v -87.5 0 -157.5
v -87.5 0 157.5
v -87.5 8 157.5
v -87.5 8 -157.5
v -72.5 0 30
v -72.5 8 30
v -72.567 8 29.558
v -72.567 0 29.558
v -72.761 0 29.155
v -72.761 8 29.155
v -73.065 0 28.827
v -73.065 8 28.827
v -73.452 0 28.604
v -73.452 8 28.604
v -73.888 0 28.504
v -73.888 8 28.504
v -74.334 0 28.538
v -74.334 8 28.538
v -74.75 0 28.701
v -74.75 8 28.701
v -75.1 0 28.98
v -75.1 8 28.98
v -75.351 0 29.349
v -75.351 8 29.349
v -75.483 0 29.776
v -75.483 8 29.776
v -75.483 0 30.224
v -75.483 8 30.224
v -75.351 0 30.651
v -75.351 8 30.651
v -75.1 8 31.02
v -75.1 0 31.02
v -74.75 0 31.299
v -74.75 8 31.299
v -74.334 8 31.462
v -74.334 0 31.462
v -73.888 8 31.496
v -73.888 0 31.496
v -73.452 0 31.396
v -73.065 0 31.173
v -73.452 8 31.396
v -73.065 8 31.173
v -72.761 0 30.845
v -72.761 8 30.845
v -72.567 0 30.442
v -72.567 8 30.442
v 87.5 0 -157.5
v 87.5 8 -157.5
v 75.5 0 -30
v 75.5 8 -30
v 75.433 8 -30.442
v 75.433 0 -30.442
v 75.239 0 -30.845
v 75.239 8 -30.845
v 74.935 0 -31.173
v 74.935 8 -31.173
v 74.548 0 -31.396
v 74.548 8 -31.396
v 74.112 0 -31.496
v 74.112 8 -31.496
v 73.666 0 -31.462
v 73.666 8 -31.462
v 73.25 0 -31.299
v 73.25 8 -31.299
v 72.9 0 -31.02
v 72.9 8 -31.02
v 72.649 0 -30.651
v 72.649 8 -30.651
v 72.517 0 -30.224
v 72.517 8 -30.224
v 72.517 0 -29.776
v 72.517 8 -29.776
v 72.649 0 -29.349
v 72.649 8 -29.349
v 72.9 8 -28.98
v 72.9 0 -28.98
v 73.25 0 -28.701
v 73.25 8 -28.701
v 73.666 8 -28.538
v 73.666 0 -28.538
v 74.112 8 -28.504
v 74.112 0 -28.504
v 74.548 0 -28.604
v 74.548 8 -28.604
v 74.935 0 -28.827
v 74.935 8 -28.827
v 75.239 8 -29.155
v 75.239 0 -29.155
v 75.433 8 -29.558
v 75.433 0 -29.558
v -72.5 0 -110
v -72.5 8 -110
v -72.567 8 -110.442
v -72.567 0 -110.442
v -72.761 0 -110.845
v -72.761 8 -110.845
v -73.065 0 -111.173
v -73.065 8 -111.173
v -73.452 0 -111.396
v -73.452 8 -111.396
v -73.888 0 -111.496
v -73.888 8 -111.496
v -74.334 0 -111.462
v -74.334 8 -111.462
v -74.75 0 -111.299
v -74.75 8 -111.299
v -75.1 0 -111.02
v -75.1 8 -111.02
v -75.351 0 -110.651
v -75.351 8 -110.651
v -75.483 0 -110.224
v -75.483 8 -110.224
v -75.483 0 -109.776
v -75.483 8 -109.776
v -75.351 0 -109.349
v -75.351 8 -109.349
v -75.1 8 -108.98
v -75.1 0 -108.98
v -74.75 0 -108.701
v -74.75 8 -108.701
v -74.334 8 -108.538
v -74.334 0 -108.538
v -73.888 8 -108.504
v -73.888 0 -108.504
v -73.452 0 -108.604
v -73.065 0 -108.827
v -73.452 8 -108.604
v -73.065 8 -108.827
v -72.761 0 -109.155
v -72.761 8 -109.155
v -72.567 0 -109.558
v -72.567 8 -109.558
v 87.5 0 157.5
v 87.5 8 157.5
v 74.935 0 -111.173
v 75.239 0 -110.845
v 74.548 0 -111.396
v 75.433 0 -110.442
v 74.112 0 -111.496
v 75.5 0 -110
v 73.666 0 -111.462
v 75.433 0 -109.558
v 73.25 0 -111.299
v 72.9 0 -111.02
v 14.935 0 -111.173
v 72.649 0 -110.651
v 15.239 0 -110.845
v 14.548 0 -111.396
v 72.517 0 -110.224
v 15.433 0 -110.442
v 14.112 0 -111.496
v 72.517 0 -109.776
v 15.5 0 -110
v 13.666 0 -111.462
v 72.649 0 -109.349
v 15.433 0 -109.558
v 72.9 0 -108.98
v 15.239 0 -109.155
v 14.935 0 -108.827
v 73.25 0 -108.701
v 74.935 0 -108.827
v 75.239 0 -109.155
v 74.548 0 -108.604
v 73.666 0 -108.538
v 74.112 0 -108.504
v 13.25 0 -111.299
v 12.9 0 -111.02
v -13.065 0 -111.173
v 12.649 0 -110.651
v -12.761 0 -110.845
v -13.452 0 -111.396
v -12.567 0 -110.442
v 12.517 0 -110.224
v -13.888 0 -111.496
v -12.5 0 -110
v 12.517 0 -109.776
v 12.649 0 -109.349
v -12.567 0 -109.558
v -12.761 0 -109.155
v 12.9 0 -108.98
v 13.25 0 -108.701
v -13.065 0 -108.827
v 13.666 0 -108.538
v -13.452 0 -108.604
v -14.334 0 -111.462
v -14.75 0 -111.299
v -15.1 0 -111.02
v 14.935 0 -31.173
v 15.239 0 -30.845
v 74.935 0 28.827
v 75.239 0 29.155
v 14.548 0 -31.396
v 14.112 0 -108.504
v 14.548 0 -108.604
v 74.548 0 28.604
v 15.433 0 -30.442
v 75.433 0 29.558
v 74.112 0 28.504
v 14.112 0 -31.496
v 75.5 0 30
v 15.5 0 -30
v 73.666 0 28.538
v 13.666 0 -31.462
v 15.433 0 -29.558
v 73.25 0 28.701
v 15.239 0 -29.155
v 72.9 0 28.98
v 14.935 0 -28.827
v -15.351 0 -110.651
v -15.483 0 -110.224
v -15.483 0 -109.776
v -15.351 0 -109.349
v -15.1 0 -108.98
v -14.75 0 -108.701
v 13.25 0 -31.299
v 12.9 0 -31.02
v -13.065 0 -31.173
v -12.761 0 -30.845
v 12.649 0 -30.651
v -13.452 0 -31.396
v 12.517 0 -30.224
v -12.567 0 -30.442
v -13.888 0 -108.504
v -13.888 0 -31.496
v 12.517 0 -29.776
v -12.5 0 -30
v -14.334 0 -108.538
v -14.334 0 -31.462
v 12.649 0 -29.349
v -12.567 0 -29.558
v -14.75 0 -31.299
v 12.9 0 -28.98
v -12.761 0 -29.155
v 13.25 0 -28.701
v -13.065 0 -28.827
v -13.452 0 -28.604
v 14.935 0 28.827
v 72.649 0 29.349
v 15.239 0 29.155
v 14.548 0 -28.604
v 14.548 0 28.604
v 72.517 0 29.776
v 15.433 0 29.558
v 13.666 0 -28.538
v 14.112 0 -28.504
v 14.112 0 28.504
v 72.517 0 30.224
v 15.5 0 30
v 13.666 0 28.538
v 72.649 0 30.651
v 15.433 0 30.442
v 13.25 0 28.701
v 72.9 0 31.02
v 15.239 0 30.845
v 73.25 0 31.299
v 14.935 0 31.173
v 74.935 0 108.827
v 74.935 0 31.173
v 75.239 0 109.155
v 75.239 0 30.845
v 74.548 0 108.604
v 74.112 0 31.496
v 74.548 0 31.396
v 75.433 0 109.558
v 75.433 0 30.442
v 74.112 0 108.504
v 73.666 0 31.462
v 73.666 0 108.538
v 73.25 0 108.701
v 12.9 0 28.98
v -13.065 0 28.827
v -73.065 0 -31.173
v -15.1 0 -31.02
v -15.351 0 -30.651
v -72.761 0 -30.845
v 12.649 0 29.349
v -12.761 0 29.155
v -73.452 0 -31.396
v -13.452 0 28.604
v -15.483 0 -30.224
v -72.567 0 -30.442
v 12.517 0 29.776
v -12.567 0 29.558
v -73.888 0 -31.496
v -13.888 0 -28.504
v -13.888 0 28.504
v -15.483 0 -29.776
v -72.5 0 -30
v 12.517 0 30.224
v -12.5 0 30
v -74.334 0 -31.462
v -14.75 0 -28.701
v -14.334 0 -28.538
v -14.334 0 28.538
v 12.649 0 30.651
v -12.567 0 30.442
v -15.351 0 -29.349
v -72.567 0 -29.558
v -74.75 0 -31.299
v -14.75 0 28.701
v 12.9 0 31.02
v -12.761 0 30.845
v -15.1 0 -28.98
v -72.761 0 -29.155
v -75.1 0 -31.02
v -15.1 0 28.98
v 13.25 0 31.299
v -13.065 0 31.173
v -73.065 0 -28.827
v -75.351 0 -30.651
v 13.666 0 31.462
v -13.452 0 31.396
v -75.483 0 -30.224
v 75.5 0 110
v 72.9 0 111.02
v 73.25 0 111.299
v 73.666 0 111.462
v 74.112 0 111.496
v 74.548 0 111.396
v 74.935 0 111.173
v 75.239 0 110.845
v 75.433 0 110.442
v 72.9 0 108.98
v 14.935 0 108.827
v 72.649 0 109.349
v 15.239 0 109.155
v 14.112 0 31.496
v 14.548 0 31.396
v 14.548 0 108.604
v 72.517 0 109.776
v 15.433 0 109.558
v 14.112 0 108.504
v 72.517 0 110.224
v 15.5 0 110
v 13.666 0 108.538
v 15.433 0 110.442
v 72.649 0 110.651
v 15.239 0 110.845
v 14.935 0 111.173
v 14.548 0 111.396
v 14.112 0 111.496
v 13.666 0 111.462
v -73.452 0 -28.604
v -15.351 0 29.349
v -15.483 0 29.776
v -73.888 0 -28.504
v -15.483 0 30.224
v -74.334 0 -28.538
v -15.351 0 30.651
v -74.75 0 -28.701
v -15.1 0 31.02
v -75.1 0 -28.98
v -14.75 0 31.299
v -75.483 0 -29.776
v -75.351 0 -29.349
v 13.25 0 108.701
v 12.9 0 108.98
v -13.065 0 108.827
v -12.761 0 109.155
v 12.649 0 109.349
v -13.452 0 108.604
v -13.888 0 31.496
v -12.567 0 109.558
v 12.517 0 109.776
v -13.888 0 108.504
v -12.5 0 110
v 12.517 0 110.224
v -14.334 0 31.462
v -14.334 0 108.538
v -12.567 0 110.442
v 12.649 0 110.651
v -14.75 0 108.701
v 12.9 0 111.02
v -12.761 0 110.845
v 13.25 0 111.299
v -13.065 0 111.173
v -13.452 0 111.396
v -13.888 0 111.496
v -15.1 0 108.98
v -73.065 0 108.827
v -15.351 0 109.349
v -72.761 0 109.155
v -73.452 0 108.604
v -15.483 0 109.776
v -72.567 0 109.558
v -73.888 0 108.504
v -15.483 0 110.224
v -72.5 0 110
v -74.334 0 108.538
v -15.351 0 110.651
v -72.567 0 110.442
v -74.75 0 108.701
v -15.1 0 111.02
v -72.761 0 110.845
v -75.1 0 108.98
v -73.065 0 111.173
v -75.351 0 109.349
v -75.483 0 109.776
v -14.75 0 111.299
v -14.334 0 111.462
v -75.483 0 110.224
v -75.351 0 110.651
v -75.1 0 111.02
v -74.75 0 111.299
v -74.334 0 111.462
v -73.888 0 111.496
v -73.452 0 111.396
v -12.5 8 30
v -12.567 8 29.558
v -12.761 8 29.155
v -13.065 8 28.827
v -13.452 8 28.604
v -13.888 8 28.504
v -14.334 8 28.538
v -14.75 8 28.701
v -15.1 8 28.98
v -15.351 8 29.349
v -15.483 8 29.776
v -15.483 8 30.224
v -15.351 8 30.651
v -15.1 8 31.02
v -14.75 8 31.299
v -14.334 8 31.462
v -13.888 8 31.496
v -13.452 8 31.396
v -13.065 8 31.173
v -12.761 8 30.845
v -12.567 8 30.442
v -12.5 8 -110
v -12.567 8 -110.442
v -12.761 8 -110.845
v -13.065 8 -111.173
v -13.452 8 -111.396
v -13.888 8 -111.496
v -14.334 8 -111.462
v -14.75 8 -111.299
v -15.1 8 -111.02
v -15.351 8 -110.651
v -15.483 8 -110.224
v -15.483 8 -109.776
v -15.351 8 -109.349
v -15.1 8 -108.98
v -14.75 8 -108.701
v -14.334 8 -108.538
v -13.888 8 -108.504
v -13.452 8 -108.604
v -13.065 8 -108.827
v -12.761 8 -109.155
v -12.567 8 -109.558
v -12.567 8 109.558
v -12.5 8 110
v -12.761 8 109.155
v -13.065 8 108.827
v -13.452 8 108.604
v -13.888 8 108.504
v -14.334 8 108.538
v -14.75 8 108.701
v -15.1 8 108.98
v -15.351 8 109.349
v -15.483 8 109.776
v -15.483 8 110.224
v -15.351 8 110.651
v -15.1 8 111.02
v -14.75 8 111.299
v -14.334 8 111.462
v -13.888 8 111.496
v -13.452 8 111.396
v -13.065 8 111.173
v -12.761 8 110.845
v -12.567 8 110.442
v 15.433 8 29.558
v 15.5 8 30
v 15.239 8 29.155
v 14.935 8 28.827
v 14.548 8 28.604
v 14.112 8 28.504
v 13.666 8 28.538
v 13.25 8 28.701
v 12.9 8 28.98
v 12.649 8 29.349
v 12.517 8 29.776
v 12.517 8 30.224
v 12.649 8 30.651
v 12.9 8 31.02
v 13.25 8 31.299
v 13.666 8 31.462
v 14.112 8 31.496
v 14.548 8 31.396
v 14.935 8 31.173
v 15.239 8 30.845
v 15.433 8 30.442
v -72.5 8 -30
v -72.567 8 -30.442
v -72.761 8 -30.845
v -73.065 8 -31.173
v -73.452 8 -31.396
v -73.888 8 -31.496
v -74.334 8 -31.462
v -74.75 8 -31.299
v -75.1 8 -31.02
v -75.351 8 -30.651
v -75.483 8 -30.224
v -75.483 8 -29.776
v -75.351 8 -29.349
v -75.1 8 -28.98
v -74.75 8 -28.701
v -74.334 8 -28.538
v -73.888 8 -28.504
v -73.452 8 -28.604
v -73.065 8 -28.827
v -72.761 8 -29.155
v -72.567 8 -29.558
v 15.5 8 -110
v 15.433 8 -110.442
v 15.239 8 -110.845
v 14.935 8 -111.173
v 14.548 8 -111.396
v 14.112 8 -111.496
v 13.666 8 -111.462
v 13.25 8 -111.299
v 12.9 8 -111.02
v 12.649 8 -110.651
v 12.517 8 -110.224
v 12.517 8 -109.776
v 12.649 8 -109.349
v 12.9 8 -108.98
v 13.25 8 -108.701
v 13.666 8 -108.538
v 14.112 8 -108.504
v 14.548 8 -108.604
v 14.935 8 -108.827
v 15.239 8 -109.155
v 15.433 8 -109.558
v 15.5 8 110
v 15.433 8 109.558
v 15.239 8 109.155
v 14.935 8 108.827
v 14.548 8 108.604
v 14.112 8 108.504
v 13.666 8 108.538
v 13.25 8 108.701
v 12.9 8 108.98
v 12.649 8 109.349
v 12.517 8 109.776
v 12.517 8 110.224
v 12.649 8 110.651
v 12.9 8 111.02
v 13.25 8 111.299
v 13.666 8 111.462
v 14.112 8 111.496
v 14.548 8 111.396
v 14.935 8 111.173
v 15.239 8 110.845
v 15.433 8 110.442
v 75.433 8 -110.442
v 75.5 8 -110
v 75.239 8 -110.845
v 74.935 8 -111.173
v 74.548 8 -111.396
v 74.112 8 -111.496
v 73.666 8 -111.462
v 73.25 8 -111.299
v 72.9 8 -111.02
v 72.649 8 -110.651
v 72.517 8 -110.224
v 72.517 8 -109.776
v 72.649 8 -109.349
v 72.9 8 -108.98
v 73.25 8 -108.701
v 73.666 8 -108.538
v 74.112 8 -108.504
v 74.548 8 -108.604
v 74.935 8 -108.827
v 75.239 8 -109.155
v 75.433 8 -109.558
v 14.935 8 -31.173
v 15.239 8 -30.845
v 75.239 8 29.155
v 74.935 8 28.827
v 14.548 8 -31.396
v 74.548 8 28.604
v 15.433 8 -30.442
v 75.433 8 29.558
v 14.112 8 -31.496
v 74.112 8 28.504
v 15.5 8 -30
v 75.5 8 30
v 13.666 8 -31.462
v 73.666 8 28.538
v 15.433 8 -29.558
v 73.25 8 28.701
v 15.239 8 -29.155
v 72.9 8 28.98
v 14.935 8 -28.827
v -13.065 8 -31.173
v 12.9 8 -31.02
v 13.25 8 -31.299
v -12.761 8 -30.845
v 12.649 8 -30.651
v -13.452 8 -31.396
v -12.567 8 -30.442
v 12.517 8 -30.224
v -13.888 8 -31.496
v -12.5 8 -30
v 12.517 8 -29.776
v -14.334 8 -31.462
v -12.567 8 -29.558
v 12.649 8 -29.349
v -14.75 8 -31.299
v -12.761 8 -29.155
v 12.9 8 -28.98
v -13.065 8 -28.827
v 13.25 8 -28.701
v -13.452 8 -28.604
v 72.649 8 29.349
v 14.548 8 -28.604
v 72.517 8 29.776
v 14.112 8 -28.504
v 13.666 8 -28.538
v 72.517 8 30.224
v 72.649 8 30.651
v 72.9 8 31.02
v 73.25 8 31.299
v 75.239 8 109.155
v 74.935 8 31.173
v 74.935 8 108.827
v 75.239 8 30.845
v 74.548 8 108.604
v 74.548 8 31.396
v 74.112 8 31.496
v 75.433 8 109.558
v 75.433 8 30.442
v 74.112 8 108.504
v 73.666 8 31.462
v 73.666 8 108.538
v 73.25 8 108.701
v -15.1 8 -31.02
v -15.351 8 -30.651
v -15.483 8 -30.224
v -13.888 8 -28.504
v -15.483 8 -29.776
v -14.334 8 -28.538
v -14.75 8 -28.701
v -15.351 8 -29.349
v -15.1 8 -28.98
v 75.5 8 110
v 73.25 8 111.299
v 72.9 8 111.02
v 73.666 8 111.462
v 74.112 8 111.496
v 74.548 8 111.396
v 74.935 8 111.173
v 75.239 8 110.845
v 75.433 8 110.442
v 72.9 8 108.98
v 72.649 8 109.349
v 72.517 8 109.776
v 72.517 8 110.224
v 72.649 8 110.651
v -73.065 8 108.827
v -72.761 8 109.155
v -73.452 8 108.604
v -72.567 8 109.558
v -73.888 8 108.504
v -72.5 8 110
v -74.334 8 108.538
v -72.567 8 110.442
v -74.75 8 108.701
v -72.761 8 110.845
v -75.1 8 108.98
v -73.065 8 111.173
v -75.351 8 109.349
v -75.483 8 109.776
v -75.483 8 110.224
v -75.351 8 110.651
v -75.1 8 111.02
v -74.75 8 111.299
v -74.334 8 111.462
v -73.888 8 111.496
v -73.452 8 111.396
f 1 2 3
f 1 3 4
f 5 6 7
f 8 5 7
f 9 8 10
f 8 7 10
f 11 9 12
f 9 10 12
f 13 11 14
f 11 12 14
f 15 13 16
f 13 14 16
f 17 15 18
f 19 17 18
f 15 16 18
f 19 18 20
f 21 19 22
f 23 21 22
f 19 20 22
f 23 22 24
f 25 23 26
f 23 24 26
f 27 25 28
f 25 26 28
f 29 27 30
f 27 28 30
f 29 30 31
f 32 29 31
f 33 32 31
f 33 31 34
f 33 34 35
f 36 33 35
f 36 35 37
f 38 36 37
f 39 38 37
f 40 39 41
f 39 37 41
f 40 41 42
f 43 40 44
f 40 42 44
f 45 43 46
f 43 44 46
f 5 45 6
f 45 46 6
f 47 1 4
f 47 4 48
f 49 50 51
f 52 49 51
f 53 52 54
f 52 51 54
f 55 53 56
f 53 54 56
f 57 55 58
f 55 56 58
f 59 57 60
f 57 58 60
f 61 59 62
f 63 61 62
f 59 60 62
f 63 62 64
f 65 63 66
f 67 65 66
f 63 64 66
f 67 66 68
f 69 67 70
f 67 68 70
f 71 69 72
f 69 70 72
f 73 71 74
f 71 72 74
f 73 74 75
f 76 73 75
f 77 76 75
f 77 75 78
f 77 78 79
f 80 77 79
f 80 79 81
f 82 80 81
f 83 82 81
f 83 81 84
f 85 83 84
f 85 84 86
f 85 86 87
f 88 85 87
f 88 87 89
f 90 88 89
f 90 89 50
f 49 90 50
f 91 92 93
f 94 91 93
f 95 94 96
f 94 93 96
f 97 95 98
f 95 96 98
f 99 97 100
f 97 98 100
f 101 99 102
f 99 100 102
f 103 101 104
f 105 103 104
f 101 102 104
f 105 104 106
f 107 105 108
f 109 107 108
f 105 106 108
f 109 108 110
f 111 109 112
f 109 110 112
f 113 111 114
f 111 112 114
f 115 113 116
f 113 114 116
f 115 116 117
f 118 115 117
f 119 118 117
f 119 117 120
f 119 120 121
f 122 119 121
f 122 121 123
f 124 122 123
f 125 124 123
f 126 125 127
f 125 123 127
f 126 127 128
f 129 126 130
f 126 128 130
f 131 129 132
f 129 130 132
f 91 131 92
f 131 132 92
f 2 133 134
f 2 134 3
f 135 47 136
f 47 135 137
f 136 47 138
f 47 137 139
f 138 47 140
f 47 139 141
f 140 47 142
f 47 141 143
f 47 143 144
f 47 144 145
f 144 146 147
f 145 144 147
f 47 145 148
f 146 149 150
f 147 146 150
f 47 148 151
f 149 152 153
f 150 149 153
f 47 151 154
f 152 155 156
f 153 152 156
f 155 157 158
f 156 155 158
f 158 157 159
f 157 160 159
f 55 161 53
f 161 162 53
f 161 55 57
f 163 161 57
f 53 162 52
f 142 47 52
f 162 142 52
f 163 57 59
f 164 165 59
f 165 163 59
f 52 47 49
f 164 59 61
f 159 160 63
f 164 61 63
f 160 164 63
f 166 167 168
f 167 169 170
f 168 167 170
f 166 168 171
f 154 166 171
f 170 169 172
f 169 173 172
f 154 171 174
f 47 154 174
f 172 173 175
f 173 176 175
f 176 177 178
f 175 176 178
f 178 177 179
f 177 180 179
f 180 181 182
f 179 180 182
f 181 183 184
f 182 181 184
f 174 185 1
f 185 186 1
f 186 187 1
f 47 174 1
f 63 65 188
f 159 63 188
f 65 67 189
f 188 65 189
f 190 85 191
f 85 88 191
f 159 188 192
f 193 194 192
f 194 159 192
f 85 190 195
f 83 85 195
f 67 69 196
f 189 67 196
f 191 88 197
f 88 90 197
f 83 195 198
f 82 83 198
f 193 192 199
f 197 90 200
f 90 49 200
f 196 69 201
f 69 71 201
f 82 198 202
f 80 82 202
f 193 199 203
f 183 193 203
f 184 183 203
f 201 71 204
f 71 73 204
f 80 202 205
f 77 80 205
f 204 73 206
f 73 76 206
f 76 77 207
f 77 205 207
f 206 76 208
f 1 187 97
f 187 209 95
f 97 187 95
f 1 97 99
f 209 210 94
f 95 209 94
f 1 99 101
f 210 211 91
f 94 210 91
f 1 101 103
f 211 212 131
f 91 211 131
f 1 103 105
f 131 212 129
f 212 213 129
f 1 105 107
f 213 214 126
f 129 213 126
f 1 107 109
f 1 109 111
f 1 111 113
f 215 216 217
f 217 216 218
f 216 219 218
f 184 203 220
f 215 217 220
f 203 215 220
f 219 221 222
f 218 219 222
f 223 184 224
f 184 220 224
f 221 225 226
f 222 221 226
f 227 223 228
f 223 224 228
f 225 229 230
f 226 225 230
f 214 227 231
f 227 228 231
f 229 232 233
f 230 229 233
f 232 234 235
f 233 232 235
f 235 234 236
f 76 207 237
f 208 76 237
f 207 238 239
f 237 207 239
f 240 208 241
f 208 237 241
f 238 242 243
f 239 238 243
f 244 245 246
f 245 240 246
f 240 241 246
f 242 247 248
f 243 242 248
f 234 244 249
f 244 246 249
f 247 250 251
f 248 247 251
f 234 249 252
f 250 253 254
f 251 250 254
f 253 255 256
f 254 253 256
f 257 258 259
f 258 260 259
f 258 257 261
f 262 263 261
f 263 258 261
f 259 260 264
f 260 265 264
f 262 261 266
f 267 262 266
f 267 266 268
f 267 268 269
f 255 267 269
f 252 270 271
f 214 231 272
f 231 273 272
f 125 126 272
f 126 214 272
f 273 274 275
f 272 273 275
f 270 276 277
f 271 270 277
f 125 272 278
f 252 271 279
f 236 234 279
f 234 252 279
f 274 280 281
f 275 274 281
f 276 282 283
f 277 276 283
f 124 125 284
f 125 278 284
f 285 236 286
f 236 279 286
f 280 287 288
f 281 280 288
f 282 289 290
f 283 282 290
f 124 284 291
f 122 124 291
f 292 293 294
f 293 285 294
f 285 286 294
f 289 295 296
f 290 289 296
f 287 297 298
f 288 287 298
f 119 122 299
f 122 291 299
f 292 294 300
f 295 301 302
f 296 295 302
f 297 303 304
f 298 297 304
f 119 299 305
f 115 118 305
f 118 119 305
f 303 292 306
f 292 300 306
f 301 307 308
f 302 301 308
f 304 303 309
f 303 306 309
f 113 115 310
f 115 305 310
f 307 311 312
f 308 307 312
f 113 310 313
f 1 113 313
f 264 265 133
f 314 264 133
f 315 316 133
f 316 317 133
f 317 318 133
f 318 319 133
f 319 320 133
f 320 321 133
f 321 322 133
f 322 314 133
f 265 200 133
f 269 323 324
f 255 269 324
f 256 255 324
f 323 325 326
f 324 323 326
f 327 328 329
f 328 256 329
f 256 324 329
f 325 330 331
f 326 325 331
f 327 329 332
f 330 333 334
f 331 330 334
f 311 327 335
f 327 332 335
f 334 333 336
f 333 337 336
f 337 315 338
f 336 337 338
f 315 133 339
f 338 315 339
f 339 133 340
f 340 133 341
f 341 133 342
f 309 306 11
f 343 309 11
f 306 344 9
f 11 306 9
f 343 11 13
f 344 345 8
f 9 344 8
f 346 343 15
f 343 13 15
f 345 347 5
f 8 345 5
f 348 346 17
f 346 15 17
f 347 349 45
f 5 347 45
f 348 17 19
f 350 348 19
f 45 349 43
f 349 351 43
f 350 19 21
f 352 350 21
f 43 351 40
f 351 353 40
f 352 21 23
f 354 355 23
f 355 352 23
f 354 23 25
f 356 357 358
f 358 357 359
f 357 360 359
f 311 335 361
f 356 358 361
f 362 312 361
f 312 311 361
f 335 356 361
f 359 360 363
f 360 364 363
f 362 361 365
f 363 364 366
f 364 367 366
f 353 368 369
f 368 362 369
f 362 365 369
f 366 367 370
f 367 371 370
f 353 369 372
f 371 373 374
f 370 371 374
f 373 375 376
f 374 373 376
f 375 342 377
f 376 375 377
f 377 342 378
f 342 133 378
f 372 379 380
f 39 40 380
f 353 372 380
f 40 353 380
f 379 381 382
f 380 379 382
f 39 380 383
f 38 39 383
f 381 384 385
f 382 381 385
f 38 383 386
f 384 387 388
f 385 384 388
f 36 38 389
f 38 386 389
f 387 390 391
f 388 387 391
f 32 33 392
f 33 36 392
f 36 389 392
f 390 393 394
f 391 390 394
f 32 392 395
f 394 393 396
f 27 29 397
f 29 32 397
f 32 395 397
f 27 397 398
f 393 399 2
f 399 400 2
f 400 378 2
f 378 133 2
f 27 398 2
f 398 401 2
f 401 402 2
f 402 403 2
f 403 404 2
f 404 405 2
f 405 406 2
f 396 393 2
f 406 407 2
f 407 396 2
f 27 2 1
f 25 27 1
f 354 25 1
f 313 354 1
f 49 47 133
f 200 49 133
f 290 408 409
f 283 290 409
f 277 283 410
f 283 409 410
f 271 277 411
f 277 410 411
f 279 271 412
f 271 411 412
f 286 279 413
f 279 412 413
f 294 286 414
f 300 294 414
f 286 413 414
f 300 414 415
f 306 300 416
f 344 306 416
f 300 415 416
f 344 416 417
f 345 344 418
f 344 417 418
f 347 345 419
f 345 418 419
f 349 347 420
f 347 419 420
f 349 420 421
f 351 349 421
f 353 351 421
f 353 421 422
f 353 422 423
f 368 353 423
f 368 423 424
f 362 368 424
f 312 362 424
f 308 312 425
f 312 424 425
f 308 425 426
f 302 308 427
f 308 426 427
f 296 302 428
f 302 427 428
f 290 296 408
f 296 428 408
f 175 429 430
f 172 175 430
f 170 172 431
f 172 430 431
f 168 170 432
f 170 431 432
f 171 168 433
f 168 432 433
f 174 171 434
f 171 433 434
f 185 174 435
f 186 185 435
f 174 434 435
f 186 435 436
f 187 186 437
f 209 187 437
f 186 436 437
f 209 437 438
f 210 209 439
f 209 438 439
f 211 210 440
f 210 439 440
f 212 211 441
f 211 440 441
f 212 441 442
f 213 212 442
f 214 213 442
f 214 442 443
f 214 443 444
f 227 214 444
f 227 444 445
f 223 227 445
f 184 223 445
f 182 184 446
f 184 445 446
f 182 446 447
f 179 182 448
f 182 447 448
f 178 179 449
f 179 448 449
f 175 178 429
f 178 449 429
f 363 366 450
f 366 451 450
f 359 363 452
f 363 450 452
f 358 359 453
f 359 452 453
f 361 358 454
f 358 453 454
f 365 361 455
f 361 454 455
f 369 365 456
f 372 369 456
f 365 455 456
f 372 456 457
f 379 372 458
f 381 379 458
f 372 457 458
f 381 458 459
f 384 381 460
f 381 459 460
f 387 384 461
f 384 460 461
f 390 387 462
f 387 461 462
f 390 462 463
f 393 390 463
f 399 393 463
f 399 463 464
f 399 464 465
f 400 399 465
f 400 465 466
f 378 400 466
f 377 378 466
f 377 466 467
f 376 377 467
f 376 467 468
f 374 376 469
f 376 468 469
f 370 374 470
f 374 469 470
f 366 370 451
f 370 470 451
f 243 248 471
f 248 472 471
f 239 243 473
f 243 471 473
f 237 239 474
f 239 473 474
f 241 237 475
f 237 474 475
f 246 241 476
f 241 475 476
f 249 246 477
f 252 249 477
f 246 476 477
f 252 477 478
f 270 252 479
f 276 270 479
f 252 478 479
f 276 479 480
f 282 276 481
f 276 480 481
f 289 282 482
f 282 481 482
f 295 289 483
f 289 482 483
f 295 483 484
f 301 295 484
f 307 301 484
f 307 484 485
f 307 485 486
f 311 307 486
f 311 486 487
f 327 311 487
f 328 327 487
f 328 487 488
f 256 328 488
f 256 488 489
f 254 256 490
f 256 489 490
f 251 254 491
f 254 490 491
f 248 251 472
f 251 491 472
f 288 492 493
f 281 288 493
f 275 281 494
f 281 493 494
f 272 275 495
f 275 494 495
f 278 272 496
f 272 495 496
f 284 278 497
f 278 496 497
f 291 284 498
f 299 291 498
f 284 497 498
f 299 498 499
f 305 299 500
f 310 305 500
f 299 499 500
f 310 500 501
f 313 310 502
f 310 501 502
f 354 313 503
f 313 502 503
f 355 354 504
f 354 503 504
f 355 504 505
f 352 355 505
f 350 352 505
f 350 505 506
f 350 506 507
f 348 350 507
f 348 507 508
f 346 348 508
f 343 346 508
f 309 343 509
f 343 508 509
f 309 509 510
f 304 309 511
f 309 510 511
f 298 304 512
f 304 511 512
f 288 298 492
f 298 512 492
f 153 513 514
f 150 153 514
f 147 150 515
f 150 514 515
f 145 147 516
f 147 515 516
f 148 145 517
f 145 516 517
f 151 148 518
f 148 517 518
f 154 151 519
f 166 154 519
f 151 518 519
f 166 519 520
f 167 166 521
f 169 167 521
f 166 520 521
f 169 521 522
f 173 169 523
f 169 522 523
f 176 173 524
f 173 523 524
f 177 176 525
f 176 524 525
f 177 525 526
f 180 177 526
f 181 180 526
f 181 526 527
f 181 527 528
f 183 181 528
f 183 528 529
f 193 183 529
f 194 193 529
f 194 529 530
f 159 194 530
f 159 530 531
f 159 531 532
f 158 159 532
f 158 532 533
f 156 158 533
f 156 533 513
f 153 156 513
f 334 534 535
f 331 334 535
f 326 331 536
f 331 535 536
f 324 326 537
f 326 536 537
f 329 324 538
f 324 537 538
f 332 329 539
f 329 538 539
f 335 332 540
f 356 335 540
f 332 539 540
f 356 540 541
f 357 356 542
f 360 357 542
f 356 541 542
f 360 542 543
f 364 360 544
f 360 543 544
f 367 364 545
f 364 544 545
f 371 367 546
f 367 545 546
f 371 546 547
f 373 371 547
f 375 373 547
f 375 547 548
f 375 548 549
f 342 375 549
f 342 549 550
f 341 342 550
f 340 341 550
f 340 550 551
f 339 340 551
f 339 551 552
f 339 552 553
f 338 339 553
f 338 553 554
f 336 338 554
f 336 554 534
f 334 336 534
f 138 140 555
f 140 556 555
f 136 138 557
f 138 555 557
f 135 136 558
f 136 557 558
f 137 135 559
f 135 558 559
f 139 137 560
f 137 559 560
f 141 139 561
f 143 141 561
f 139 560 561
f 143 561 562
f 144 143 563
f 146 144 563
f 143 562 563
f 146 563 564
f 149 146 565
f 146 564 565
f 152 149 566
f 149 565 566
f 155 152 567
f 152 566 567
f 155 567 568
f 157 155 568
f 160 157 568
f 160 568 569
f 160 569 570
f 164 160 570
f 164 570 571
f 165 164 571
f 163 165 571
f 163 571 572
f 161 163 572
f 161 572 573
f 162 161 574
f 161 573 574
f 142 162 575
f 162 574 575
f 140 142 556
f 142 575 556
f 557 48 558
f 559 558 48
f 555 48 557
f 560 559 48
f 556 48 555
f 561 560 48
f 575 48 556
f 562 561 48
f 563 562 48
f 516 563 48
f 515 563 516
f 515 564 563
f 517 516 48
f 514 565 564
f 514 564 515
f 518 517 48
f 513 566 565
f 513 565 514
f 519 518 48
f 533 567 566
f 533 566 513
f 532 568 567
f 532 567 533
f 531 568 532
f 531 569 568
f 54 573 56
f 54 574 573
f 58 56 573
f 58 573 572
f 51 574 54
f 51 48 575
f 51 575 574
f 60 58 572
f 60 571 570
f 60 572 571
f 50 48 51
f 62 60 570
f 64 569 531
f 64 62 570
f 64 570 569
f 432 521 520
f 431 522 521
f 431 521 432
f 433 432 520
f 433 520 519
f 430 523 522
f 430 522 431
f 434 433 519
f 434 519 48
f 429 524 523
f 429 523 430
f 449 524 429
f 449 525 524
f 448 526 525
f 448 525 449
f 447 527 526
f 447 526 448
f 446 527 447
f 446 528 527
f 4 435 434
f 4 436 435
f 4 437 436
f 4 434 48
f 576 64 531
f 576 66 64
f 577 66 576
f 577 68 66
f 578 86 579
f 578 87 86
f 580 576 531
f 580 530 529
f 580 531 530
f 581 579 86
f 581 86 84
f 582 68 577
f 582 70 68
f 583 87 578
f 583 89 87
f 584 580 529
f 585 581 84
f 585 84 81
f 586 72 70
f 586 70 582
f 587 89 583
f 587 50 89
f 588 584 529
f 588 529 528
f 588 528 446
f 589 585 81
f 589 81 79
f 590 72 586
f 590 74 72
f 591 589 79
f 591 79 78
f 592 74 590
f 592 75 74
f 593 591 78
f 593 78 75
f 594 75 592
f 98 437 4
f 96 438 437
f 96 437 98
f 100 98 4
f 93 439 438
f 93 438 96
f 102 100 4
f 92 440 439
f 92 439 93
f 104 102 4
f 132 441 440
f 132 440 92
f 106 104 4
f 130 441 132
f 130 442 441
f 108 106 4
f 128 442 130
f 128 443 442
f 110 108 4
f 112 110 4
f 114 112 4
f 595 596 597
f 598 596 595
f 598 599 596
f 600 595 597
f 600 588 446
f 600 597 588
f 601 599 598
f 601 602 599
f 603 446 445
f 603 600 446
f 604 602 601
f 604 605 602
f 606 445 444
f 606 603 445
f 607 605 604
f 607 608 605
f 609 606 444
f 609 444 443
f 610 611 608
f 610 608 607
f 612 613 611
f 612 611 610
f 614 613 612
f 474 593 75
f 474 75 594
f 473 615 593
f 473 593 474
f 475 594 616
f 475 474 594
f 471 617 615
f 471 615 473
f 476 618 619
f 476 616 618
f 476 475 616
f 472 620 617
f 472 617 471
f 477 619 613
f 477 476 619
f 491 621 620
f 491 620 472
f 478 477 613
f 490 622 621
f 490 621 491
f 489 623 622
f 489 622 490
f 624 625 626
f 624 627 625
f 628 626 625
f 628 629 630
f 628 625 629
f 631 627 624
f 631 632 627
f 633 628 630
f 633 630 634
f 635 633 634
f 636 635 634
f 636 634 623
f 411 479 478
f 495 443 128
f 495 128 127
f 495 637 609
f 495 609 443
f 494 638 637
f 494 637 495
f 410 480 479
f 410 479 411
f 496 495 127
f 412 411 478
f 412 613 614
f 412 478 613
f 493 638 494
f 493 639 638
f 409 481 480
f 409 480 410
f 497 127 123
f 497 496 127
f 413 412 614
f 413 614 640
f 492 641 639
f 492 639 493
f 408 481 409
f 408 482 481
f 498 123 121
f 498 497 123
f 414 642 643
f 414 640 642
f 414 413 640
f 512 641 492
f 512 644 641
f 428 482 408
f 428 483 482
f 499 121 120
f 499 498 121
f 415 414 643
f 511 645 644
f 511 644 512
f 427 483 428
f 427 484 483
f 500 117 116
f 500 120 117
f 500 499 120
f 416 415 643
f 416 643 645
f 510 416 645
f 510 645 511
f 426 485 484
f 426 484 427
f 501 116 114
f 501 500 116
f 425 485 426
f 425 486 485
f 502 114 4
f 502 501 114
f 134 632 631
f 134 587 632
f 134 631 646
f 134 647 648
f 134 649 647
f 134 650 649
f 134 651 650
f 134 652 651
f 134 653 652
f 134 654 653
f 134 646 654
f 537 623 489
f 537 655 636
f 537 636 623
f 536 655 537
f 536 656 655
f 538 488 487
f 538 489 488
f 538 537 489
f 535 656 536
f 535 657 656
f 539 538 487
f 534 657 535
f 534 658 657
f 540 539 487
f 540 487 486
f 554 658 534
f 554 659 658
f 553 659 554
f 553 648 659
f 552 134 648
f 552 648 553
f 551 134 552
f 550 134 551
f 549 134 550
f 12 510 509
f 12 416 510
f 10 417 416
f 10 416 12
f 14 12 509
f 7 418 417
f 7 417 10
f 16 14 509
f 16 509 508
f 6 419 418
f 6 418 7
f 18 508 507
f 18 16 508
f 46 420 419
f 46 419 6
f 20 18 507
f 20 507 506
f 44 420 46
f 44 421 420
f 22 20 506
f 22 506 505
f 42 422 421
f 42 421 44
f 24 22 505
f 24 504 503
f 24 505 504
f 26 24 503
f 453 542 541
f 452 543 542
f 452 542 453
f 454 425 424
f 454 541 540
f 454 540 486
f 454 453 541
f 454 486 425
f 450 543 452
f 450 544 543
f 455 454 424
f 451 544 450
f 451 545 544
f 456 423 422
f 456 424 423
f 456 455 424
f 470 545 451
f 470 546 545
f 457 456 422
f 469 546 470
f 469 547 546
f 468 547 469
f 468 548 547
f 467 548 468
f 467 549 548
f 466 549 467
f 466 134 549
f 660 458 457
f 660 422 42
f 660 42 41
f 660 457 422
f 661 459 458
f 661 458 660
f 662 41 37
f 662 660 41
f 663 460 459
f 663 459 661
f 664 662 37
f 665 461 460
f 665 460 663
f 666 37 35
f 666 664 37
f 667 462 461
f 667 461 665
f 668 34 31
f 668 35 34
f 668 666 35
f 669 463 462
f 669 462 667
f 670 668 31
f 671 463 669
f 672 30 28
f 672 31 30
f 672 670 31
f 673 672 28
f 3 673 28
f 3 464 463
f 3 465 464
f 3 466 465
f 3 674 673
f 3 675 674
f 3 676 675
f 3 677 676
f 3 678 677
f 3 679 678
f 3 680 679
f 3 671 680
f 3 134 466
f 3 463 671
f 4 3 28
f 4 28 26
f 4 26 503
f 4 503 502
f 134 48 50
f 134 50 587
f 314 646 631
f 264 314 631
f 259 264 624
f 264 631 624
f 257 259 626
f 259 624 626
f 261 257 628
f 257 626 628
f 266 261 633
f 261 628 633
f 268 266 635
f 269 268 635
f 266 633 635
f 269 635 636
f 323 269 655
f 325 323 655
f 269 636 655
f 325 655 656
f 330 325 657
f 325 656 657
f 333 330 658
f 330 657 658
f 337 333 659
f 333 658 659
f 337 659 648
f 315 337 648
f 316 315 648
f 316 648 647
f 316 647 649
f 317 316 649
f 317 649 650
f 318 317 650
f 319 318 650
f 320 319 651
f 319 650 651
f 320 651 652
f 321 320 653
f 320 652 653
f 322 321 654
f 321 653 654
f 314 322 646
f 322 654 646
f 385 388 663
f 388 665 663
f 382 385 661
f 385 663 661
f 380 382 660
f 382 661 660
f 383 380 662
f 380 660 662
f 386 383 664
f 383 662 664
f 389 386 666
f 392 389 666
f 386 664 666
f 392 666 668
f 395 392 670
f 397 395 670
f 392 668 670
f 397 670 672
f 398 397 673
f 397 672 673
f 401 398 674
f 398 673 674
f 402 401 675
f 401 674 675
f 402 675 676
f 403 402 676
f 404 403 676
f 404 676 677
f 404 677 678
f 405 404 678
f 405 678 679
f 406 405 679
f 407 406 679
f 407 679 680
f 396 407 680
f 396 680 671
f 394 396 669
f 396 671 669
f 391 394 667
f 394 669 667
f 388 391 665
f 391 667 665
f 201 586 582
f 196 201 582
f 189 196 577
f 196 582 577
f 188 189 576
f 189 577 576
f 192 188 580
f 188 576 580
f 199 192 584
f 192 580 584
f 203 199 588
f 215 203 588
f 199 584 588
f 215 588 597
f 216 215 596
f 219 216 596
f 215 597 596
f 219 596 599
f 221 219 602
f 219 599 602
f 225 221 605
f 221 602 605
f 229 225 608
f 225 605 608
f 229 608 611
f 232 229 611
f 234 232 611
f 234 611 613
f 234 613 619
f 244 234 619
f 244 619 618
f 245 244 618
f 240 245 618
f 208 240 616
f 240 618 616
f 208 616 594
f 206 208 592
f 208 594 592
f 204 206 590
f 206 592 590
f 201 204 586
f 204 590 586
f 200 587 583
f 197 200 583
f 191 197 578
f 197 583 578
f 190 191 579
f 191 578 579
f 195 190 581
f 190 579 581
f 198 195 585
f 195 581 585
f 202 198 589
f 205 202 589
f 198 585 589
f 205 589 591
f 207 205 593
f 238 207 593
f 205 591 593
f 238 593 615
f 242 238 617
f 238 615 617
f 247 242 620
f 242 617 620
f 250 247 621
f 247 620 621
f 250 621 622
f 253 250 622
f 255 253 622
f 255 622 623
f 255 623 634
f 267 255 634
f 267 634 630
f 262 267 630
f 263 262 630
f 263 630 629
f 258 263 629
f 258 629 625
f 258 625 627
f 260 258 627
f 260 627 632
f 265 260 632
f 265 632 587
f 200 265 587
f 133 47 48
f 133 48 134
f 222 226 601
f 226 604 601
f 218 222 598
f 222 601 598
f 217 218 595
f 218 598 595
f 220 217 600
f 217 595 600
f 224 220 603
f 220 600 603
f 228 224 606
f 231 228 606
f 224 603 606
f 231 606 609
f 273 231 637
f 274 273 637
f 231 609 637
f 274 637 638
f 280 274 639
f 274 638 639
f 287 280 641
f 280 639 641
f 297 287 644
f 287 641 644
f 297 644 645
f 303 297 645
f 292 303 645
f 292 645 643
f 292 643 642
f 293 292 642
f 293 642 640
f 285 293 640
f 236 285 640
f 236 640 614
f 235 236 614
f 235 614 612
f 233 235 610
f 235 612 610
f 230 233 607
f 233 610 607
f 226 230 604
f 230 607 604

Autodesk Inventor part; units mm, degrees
ref_plane "YZ Plane" through (0, 0, 0) normal (1, 0, 0) x (0, 1, 0)
ref_plane "XZ Plane" through (0, 0, 0) normal (0, 1, 0) x (-1, 0, 0)
ref_plane "XY Plane" through (0, 0, 0) normal (0, 0, 1) x (1, 0, 0)
sketch "Sketch1" plane through (0, 0, 0) normal (0, 1, 0) x (-1, 0, 0)
  line L0 (-87.5, 157.5) -> (87.5, 157.5)
  line L1 (87.5, 157.5) -> (87.5, -157.5)
  line L2 (87.5, -157.5) -> (-87.5, -157.5)
  line L3 (-87.5, -157.5) -> (-87.5, 157.5)
  line L4 (-87.5, 157.5) -> (87.5, -157.5) construction
  line L5 (87.5, 157.5) -> (-87.5, -157.5) construction
  point P0 (0, 0)
  dimension "d0" = 315
  dimension "d1" = 175
extrude "Extrusion1" add sketch "Sketch1" along normal blind 8
sketch "Sketch2" plane through (0, 8, 0) normal (0, 1, 0) x (1, 0, 0)
  circle A0 centre (-74, -110) radius 1.5
  line L0 (-87.5, 157.5) -> (-87.5, -157.5) projected
  line L1 (-87.5, -157.5) -> (87.5, -157.5) projected
  circle A1 centre (-74, -30) radius 1.5
  circle A2 centre (-14, -110) radius 1.5
  circle A3 centre (-14, -30) radius 1.5
  line L2 (-122.5, 0) -> (122.5, 0) projected
  line L3 (0, 220.5) -> (0, -220.5) projected
  circle A4 centre (-74, 110) radius 1.5
  circle A5 centre (-74, 30) radius 1.5
  circle A6 centre (-14, 110) radius 1.5
  circle A7 centre (-14, 30) radius 1.5
  circle A8 centre (74, -110) radius 1.5
  circle A9 centre (74, -30) radius 1.5
  circle A10 centre (14, -110) radius 1.5
  circle A11 centre (14, -30) radius 1.5
  circle A12 centre (74, 110) radius 1.5
  circle A13 centre (74, 30) radius 1.5
  circle A14 centre (14, 110) radius 1.5
  circle A15 centre (14, 30) radius 1.5
  point P0 (0, 0)
  dimension "d6" = 80
  dimension "d9" = 60
  dimension "d12" = 14
  dimension "d13" = 30
  dimension "d14" = 3
extrude "Extrusion2" cut sketch "Sketch2" against normal up to next contours A0 | A1 | A2 | A3 | A4 | A5 | A6 | A7 | A8 | A9 | A10 | A11 | A12 | A13 | A14 | A15
equation "\"d0\" = 3.5 * L_pcb_outer"
equation "\"d1\" = 2.5 * W_pcb_outer"
equation "\"d2\" = T_fastener"
equation "\"d6\" = L_pcb_holetohole"
equation "\"d9\" = W_pcb_holetohole"
equation "\"d12\" = 0.2 * W_pcb_outer"
equation "\"d13\" = 0.333333 * L_pcb_outer"
equation "\"d15\" = T_fastener"
equation "\"L_pcb_holetohole\" = 80"
equation "\"W_pcb_holetohole\" = 60"
equation "\"T_fastener\" = 8"
equation "\"L_pcb_outer\" = 90"
equation "\"W_pcb_outer\" = 70"
properties part number "Fastener" material "PC/ABS Plastic"
